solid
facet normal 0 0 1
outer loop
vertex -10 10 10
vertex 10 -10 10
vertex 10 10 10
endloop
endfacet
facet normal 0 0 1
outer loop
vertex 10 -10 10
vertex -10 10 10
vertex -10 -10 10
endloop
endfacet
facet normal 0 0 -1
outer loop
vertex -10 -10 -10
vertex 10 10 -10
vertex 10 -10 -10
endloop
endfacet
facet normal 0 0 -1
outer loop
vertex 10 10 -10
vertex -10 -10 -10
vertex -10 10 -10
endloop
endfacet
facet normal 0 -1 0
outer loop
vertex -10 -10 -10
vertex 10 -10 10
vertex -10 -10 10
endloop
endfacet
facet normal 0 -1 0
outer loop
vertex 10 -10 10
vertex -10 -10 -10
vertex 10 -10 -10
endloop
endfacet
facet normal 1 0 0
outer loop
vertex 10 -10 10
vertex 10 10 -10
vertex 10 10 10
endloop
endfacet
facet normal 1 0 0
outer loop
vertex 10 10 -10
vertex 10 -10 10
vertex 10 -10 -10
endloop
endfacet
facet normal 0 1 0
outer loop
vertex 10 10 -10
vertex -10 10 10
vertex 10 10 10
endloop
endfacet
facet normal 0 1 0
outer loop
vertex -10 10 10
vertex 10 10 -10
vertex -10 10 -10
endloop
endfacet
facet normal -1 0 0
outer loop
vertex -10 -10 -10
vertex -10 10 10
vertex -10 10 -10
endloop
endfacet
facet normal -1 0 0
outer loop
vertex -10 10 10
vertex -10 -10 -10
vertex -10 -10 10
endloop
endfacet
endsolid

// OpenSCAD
// Parameters
cube_size = 20;
$fn = 32;

// Model
color("red")
  cube([cube_size, cube_size, cube_size], center=true);
